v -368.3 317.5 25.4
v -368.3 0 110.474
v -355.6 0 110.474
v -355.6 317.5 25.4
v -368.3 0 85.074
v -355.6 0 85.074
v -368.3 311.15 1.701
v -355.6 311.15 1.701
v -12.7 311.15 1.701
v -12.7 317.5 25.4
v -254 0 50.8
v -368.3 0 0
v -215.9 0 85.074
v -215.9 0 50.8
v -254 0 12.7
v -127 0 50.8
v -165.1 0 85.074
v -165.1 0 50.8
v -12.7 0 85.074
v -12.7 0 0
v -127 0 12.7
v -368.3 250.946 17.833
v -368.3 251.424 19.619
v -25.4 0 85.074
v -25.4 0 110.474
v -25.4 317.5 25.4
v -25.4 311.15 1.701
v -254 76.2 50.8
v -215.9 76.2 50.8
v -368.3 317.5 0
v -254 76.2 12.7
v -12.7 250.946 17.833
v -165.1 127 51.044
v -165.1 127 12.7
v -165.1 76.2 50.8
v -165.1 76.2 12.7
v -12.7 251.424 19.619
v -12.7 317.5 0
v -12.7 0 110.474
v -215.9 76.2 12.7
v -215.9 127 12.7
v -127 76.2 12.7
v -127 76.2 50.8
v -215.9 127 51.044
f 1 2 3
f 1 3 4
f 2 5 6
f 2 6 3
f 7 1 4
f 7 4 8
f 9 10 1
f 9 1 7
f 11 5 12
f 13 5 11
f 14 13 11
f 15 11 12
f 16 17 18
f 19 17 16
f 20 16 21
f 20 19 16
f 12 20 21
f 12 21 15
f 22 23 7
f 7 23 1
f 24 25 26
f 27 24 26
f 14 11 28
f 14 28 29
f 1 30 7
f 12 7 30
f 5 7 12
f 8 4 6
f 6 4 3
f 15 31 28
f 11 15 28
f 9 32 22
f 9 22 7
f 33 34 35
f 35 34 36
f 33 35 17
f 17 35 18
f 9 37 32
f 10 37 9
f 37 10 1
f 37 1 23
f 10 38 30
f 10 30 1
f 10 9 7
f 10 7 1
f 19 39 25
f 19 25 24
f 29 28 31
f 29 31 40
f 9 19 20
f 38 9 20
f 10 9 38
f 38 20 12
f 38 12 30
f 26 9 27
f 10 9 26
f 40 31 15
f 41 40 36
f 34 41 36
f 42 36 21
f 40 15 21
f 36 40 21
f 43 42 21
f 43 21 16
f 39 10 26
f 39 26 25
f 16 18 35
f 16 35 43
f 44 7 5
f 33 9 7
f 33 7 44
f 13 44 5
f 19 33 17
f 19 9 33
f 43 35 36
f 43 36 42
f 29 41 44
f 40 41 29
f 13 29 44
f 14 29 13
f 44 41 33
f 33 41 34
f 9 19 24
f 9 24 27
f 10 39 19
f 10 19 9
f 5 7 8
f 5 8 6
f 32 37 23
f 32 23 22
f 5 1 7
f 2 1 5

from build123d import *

# Parameters (mm, degrees)
F1_DEPTH  = 381
F3_START  = -12.7
F2_W      = 50.8
F2_H      = 127
F3_DEPTH  = 72.3748685969
F4_W      = 127
F4_H      = 38.1
F5_DEPTH  = 76.2
F7_DEPTH  = 381
F9_DEPTH  = 25.4
F11_DEPTH = 25.4
F13_DEPTH = 12.7
F15_DEPTH = 12.7
F17_DEPTH = 355.6


with BuildPart() as f1:
    # F0 (on Right) → F1 (new body)
    with BuildSketch(Plane.YZ):
        Polygon((0, 85.0738685969), (0, 0), (317.5, 0), align=None)
    extrude(amount=-F1_DEPTH)

    # F2 (on face) → F3 (cut)
    with BuildSketch(Plane(origin=(0, 0, 0), x_dir=(1, 0, 0), z_dir=(0, 0, -1)).offset(F3_START)):
        with Locations((-190.5, -63.5)):
            Rectangle(F2_W, F2_H)
    extrude(amount=-F3_DEPTH, mode=Mode.SUBTRACT)

    # F4 (on face) → F5 (cut)
    with BuildSketch(Plane.XZ):
        with Locations((-190.5, 31.75)):
            Rectangle(F4_W, F4_H)
    extrude(amount=-F5_DEPTH, mode=Mode.SUBTRACT)

    # F6 (on face) → F7 (join)
    with BuildSketch(Plane.YZ):
        Polygon((311.15, 1.7014773719), (317.5, 0), (317.5, 25.4), align=None)
    extrude(amount=-F7_DEPTH)


with BuildPart() as f9:
    # F8 (on face) → F9 (new body)
    with BuildSketch(Plane.YZ):
        Polygon((311.15, 1.7014773719), (317.5, 25.4), (0, 110.4738685969), (0, 85.0738685969), align=None)
    extrude(amount=-F9_DEPTH)


with BuildPart() as f11:
    # F10 (on face) → F11 (new body)
    with BuildSketch(Plane(origin=(-381, 0, 0), x_dir=(0, -1, 0), z_dir=(-1, 0, 0))):
        Polygon((0, 110.4738685969), (-317.5, 25.4), (-311.15, 1.7014773719), (0, 85.0738685969), align=None)
    extrude(amount=-F11_DEPTH)


with BuildPart() as f13_tool:
    # F12 (on face) → F13 (new body)
    with BuildSketch(Plane(origin=(-381, 0, 0), x_dir=(0, -1, 0), z_dir=(-1, 0, 0))):
        Polygon((-317.5, 25.4), (-317.5, 0), (0, 0), (0, 110.4738685969), align=None)
    extrude(amount=-F13_DEPTH)


with BuildPart() as f1_1:
    add(f1.part)

    # F13: cut by f13_tool
    add(f13_tool.part, mode=Mode.SUBTRACT)


with BuildPart() as f11_1:
    add(f11.part)

    # F13: cut by f13_tool
    add(f13_tool.part, mode=Mode.SUBTRACT)


with BuildPart() as f15_tool:
    # F14 (on face) → F15 (new body)
    with BuildSketch(Plane.YZ):
        Polygon((0, 0), (317.5, 0), (317.5, 25.4), (0, 110.4738685969), align=None)
    extrude(amount=-F15_DEPTH)


with BuildPart() as f1_2:
    add(f1_1.part)

    # F15: cut by f15_tool
    add(f15_tool.part, mode=Mode.SUBTRACT)


with BuildPart() as f9_1:
    add(f9.part)

    # F15: cut by f15_tool
    add(f15_tool.part, mode=Mode.SUBTRACT)


with BuildPart() as f17:
    # F16 (on face) → F17 (new body)
    with BuildSketch(Plane.YZ.offset(-12.7)):
        Polygon((311.15, 1.7014773719), (317.5, 25.4), (251.4242957392, 19.6191249427), (250.9457474025, 17.8331582364), align=None)
    extrude(amount=-F17_DEPTH)


solid = Compound([f11_1.part, f1_2.part, f9_1.part, f17.part])
